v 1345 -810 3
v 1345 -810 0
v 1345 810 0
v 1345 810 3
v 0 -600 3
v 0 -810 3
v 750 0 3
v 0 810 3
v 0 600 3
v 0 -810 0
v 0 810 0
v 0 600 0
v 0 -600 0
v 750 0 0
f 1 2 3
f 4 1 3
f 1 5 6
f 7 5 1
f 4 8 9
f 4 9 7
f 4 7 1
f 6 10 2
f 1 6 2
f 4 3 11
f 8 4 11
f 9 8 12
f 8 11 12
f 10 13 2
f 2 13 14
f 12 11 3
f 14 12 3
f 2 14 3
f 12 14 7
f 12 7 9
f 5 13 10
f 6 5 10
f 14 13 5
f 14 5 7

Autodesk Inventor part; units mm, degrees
ref_plane "YZ Plane" through (0, 0, 0) normal (1, 0, 0) x (0, 1, 0)
ref_plane "XZ Plane" through (0, 0, 0) normal (0, 1, 0) x (-1, 0, 0)
ref_plane "XY Plane" through (0, 0, 0) normal (0, 0, 1) x (1, 0, 0)
sketch "Sketch1" plane through (0, 0, 0) normal (0, 0, 1) x (1, 0, 0)
  line L0 (0, -810) -> (1345, -810)
  line L1 (1345, -810) -> (1345, 810)
  line L2 (1345, 810) -> (0, 810)
  line L3 (0, 810) -> (0, -810)
  point P0 (0, 0)
  point P1 (0, 0)
  dimension "d0" = 1345
  dimension "d1" = 1620
extrude "Plate1" add sketch "Sketch1" along normal blind 3
sketch "Sketch5" plane through (0, 0, 0) normal (0, 0, -1) x (-1, 0, 0)
  line L0 (0, -810) -> (-1345, -810) construction
  line L1 (0, 810) -> (0, -810) projected
  line L2 (-1345, 810) -> (0, 810) construction
  line L3 (-1345, -810) -> (-1345, 810) construction
  line L4 (0, -600) -> (-750, 0)
  line L5 (-750, 0) -> (0, 600)
  line L6 (12.3081, -1975.0573) -> (-487.6919, -1975.0573)
  line L7 (-487.6919, -1975.0573) -> (-487.6919, -2425.2593)
  line L8 (-487.6919, -2425.2593) -> (12.3081, -1975.0573)
  point P0 (0, 0)
  point P1 (0, 0)
  dimension "d26" = 500
  dimension "d27" = 48
  dimension "d28" = 672.8164
  dimension "d29" = 750
  dimension "d30" = 1200
extrude "Cut1" cut sketch "Sketch5" against normal blind 3 contours L1 L4 L5
equation "\"d31\" = Thickness"
equation "\"d2\" = Thickness"
equation "\"BendReliefWidth\" = Thickness"
equation "\"BendReliefDepth\" = 0.5 * Thickness"
equation "\"CornerReliefSize\" = 4 * Thickness"
equation "\"MinimumRemnant\" = 2 * Thickness"
equation "\"TransitionRadius\" = BendRadius"
equation "\"JacobiRadiusSize\" = BendRadius"
equation "\"GapSize\" = Thickness"
equation "\"Thickness\" = 3"
equation "\"BendRadius\" = 5"
properties part number "BSH 014 board cone 4" material "09g2s"
